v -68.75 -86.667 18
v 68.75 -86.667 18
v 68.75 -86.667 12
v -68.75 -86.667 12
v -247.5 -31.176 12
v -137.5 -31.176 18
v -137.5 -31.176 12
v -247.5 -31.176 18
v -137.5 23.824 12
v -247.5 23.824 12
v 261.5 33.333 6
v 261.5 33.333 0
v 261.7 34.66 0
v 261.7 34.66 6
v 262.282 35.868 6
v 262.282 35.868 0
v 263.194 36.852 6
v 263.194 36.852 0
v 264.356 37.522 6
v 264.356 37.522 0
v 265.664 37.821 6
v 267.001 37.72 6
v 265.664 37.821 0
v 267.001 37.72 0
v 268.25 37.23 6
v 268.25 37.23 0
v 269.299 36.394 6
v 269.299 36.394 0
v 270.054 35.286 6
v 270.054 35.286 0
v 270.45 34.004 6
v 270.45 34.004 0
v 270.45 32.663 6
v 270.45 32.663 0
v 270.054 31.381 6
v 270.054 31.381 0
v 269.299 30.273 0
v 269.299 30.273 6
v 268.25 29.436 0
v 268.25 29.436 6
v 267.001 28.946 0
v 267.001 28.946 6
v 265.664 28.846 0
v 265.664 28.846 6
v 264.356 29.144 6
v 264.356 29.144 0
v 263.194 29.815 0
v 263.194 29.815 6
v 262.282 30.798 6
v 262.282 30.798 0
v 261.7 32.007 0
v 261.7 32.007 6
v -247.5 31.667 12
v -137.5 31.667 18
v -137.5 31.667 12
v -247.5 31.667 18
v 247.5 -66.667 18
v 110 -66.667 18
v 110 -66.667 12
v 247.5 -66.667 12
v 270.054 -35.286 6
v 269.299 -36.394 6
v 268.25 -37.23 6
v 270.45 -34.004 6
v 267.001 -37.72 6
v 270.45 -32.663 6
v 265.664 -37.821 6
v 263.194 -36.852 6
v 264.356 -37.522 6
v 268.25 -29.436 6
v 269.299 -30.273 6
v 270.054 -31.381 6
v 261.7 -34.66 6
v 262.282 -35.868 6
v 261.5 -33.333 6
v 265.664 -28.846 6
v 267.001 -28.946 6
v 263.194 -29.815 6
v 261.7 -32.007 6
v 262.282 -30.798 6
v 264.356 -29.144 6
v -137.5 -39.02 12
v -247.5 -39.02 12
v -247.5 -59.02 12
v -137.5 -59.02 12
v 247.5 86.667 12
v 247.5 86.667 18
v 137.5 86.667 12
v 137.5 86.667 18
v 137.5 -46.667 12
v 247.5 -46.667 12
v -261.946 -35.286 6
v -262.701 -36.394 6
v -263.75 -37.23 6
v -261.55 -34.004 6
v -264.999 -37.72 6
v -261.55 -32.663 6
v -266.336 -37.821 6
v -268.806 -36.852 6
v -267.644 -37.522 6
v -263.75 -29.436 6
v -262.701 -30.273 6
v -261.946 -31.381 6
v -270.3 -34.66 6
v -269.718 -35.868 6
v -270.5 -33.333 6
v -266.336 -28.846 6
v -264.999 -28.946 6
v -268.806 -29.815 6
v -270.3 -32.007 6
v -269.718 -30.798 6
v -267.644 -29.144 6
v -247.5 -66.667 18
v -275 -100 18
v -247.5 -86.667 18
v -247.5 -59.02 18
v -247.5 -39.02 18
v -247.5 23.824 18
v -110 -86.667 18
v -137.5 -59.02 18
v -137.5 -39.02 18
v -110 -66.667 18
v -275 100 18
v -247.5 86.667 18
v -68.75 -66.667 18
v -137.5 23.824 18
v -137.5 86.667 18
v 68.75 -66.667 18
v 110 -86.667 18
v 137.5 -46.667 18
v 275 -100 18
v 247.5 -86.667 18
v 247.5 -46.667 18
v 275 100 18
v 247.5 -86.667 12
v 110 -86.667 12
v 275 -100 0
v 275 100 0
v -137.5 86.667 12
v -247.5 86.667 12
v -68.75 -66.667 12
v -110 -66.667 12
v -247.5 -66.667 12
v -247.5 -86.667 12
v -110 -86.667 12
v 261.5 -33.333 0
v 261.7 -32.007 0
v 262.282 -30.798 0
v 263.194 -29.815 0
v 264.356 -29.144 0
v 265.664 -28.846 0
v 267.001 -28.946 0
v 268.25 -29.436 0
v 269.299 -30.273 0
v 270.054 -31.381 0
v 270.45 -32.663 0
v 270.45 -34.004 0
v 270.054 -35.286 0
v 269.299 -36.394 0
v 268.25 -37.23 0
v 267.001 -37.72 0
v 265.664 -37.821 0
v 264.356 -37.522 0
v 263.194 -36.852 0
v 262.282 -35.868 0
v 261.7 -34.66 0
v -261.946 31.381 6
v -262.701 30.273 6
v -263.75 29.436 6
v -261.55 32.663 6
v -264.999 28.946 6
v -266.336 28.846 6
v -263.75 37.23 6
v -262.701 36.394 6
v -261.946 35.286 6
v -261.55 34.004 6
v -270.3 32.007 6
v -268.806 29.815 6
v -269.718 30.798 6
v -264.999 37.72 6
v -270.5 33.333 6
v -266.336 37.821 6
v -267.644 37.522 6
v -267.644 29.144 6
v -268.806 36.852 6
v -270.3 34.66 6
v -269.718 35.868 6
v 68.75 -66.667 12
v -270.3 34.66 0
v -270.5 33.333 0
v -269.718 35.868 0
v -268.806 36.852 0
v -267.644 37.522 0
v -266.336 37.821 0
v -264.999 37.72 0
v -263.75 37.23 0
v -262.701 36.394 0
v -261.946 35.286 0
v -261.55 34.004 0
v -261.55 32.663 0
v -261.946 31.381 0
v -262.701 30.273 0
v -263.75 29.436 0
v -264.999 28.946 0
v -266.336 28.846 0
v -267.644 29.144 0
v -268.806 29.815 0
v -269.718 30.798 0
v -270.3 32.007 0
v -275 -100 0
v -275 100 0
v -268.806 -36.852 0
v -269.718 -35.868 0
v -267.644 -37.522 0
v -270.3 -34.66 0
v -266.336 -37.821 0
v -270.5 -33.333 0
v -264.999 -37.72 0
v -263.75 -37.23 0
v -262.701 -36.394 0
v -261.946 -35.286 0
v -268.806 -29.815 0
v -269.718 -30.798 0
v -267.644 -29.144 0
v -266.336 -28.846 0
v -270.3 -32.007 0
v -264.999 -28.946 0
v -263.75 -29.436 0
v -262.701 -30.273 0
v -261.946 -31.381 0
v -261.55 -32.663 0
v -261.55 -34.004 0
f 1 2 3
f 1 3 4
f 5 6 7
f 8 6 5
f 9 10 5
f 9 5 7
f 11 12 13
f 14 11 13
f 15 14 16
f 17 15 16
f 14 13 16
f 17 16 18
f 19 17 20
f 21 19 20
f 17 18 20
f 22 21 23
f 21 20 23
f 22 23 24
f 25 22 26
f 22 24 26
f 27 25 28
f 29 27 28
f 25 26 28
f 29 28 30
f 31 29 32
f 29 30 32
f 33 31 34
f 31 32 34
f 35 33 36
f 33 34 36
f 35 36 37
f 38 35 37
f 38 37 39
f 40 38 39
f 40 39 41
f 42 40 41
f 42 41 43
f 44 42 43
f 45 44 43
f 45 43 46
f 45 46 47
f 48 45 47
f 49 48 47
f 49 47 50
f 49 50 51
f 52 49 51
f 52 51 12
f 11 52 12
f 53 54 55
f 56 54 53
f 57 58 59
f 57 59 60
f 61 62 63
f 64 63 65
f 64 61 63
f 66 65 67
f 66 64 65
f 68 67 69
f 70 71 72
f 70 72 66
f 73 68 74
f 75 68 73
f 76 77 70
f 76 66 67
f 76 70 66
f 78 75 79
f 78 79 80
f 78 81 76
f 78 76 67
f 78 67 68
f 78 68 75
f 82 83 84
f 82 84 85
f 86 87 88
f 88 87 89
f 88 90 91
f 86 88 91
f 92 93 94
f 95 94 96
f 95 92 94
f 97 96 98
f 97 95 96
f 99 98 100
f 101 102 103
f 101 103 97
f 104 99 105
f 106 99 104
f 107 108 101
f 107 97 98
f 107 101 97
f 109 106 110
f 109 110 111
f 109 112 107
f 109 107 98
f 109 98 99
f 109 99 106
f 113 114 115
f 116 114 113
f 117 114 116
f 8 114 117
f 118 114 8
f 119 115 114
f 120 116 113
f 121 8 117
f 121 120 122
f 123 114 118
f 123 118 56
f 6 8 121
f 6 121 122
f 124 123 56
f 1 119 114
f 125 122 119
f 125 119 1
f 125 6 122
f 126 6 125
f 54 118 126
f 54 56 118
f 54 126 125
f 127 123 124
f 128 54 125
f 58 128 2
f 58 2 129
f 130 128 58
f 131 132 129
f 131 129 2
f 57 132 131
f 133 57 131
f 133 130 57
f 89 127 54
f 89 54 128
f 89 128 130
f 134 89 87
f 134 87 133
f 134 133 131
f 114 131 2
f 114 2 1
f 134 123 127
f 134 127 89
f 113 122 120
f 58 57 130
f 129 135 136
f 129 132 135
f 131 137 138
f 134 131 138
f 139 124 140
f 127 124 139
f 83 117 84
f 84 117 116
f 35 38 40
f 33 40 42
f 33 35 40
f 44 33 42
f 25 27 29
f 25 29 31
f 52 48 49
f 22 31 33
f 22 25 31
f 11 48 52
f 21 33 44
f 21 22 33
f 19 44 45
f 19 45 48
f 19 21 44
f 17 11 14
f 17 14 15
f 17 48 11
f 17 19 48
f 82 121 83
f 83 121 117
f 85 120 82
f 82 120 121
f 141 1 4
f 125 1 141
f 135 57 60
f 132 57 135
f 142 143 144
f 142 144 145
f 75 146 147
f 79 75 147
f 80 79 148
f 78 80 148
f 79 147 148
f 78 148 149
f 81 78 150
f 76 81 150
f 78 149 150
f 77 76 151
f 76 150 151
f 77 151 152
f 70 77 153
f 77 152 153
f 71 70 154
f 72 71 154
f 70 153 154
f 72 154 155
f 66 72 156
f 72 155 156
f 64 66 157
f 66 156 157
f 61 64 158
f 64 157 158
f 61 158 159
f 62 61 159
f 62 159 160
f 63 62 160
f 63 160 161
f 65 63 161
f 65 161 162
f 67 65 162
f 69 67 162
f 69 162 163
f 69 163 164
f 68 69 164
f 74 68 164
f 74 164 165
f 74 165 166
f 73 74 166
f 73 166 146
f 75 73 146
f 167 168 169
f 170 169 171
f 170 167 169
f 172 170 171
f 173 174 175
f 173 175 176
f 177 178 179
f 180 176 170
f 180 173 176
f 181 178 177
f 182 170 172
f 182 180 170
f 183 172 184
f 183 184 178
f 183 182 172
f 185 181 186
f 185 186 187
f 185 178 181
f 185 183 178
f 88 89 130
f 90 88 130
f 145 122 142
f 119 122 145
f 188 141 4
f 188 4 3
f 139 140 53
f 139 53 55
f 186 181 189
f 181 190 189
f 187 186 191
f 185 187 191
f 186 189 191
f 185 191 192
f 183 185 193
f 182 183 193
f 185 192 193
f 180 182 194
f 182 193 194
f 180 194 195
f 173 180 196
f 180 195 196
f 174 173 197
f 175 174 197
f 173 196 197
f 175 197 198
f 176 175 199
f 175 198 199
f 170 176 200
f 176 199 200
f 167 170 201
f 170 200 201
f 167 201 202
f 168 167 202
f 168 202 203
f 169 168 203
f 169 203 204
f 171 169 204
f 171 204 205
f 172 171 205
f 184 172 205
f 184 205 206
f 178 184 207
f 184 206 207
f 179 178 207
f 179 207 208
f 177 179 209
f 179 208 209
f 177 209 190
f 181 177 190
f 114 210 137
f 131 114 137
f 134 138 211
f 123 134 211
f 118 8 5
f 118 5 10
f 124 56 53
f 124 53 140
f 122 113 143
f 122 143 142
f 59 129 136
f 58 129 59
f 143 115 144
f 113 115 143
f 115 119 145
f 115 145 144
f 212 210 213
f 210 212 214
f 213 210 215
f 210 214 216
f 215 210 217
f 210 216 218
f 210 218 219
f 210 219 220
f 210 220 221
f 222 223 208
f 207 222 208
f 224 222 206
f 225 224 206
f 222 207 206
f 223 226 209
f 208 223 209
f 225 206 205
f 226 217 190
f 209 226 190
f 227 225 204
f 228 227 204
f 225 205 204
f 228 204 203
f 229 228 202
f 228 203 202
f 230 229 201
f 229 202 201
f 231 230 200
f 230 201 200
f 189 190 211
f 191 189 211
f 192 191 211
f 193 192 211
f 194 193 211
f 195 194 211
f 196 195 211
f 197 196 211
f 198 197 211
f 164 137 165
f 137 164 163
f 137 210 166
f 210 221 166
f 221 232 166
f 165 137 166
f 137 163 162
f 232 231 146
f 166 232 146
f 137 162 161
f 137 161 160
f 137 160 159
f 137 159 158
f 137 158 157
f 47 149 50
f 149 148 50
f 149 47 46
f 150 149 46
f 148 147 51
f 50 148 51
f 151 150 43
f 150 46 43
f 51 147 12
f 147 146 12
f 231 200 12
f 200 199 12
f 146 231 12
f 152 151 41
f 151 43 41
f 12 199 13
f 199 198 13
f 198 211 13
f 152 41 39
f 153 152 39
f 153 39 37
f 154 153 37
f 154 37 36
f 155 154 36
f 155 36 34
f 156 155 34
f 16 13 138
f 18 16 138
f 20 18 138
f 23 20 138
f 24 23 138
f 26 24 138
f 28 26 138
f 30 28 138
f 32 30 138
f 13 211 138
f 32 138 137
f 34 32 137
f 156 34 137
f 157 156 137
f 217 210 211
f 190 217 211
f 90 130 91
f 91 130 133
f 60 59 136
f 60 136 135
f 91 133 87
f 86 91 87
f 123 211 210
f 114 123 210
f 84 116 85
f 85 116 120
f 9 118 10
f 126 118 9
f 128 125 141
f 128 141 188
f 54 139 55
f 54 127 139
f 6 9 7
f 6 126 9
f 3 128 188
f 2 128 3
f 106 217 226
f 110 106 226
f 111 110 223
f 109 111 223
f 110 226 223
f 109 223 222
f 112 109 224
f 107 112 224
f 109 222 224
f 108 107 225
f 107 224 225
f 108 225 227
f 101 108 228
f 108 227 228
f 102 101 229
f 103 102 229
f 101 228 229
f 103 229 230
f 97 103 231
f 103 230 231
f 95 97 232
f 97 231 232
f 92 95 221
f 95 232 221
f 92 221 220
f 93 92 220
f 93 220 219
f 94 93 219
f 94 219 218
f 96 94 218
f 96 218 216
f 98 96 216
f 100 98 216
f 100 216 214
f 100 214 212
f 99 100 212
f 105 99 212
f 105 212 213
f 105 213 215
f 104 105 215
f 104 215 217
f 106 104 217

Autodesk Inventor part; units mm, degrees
ref_plane "YZ Plane" through (0, 0, 0) normal (1, 0, 0) x (0, 1, 0)
ref_plane "XZ Plane" through (0, 0, 0) normal (0, 1, 0) x (-1, 0, 0)
ref_plane "XY Plane" through (0, 0, 0) normal (0, 0, 1) x (1, 0, 0)
sketch "Boceto1" plane through (0, 0, 0) normal (0, 0, 1) x (1, 0, 0)
  line L0 (-275, -100) -> (275, -100)
  line L1 (275, -100) -> (275, 100)
  line L2 (275, 100) -> (-275, 100)
  line L3 (-275, 100) -> (-275, -100)
  line L4 (-275, -100) -> (275, 100) construction
  line L5 (275, -100) -> (-275, 100) construction
  point P0 (0, 0)
  dimension "ancho" = 550
  dimension "alto" = 200
extrude "Extrusión1" add sketch "Boceto1" along normal blind 18
sketch "Boceto2" plane through (0, 0, 18) normal (0, 0, 1) x (1, 0, 0)
  line L0 (247.5, -86.6667) -> (110, -86.6667)
  line L1 (110, -86.6667) -> (110, -66.6667)
  line L2 (110, -66.6667) -> (247.5, -66.6667)
  line L3 (247.5, -66.6667) -> (247.5, -86.6667)
  line L4 (275, -100) -> (275, 100) projected
  line L5 (-110, -86.6667) -> (-247.5, -86.6667)
  line L6 (-247.5, -86.6667) -> (-247.5, -66.6667)
  line L7 (-247.5, -66.6667) -> (-110, -66.6667)
  line L8 (-110, -66.6667) -> (-110, -86.6667)
  line L9 (-275, 100) -> (-275, -100) projected
  line L10 (-275, -100) -> (275, -100) projected
  line L11 (68.75, -86.6667) -> (-68.75, -86.6667)
  line L12 (-68.75, -86.6667) -> (-68.75, -66.6667)
  line L13 (-68.75, -66.6667) -> (68.75, -66.6667)
  line L14 (68.75, -66.6667) -> (68.75, -86.6667)
  line L15 (275, 100) -> (-275, 100) projected
  line L16 (247.5, 86.6667) -> (137.5, 86.6667)
  line L17 (137.5, 86.6667) -> (137.5, -46.6667)
  line L18 (137.5, -46.6667) -> (247.5, -46.6667)
  line L19 (247.5, -46.6667) -> (247.5, 86.6667)
  line L20 (-247.5, 86.6667) -> (-137.5, 86.6667)
  line L21 (-137.5, 86.6667) -> (-137.5, 31.6667)
  line L22 (-137.5, 31.6667) -> (-247.5, 31.6667)
  line L23 (-247.5, 31.6667) -> (-247.5, 86.6667)
  line L24 (-247.5, 23.8235) -> (-137.5, 23.8235)
  line L25 (-137.5, 23.8235) -> (-137.5, -31.1765)
  line L26 (-137.5, -31.1765) -> (-247.5, -31.1765)
  line L27 (-247.5, -31.1765) -> (-247.5, 23.8235)
  line L28 (-247.5, -59.0196) -> (-137.5, -59.0196)
  line L29 (-137.5, -59.0196) -> (-137.5, -39.0196)
  line L30 (-137.5, -39.0196) -> (-247.5, -39.0196)
  line L31 (-247.5, -39.0196) -> (-247.5, -59.0196)
  point P0 (0, 0)
  dimension "d4" = 137.5
  dimension "d5" = 20
  dimension "d6" = 27.5
  dimension "d7" = 137.5
  dimension "d8" = 20
  dimension "d9" = 27.5
  dimension "d10" = 13.3333
  dimension "d11" = 13.3333
  dimension "d12" = 137.5
  dimension "d13" = 41.25
  dimension "d14" = 41.25
  dimension "d15" = 20
  dimension "d17" = 110
  dimension "d18" = 133.3333
  dimension "d19" = 27.5
  dimension "d20" = 13.3333
  dimension "d21" = 110
  dimension "d22" = 55
  dimension "d23" = 27.5
  dimension "d24" = 13.3333
  dimension "d25" = 110
  dimension "d26" = 55
  dimension "d27" = 27.5
  dimension "d28" = 7.8431
  dimension "d29" = 110
  dimension "d30" = 20
  dimension "d31" = 7.8431
  dimension "d32" = 7.6471
extrude "Extrusión2" cut sketch "Boceto2" against normal blind 6 contours L0 L1 L2 L3 | L5 L6 L7 L8 | L11 L12 L13 L14 | L19 L18 L17 L16 | L20 L21 L22 L23 | L24 L25 L26 L27 | L31 L30 L29 L28
sketch "Boceto3" plane through (0, 0, 0) normal (0, 0, -1) x (-1, 0, 0)
  circle A0 centre (266, -33.3333) radius 4.5
  circle A1 centre (266, 33.3333) radius 4.5
  circle A2 centre (-266, 33.3333) radius 4.5
  circle A3 centre (-266, -33.3333) radius 4.5
  line L0 (275, 100) -> (275, -100) projected
  line L1 (275, -100) -> (-275, -100) projected
  line L2 (-275, 100) -> (275, 100) projected
  line L3 (-275, -100) -> (-275, 100) projected
  point P0 (0, 0)
  dimension "d35" = 9
  dimension "d36" = 9
  dimension "d37" = 9
  dimension "d38" = 9
  dimension "d39" = 9
  dimension "d40" = 66.6667
  dimension "d41" = 9
  dimension "d42" = 66.6667
  dimension "d43" = 9
  dimension "d44" = 66.6667
  dimension "d45" = 9
  dimension "d46" = 66.6667
extrude "Extrusión3" cut sketch "Boceto3" against normal blind 6 contours A0 | A1 | A2 | A3
equation "\"d4\" = 0.25 * ancho"
equation "\"d5\" = 0.1 * alto"
equation "\"d6\" = 0.05 * ancho"
equation "\"d7\" = d4"
equation "\"d8\" = d5"
equation "\"d9\" = d6"
equation "\"d10\" = 0.0666667 * alto"
equation "\"d11\" = 0.0666667 * alto"
equation "\"d12\" = d4"
equation "\"d13\" = d14"
equation "\"d15\" = d5"
equation "\"d17\" = 0.2 * ancho"
equation "\"d18\" = 0.666667 * alto"
equation "\"d19\" = d6"
equation "\"d20\" = d10"
equation "\"d21\" = 0.2 * ancho"
equation "\"d22\" = 0.1 * ancho"
equation "\"d23\" = d9"
equation "\"d24\" = d11"
equation "\"d25\" = d21"
equation "\"d26\" = d22"
equation "\"d27\" = d23"
equation "\"d28\" = 0.0392157 * alto"
equation "\"d29\" = d21"
equation "\"d30\" = d5"
equation "\"d31\" = d28"
equation "\"d33\" = 0.333333 * grosor"
equation "\"d35\" = 0.5 * grosor"
equation "\"d36\" = d35"
equation "\"d37\" = d35"
equation "\"d38\" = d35"
equation "\"d39\" = 0.5 * grosor"
equation "\"d40\" = 0.333333 * alto"
equation "\"d41\" = d39"
equation "\"d42\" = d40"
equation "\"d43\" = d39"
equation "\"d44\" = d40"
equation "\"d45\" = d39"
equation "\"d46\" = d40"
equation "\"d47\" = 0.333333 * grosor"
equation "\"grosor\" = 18"
properties part number "Base"
